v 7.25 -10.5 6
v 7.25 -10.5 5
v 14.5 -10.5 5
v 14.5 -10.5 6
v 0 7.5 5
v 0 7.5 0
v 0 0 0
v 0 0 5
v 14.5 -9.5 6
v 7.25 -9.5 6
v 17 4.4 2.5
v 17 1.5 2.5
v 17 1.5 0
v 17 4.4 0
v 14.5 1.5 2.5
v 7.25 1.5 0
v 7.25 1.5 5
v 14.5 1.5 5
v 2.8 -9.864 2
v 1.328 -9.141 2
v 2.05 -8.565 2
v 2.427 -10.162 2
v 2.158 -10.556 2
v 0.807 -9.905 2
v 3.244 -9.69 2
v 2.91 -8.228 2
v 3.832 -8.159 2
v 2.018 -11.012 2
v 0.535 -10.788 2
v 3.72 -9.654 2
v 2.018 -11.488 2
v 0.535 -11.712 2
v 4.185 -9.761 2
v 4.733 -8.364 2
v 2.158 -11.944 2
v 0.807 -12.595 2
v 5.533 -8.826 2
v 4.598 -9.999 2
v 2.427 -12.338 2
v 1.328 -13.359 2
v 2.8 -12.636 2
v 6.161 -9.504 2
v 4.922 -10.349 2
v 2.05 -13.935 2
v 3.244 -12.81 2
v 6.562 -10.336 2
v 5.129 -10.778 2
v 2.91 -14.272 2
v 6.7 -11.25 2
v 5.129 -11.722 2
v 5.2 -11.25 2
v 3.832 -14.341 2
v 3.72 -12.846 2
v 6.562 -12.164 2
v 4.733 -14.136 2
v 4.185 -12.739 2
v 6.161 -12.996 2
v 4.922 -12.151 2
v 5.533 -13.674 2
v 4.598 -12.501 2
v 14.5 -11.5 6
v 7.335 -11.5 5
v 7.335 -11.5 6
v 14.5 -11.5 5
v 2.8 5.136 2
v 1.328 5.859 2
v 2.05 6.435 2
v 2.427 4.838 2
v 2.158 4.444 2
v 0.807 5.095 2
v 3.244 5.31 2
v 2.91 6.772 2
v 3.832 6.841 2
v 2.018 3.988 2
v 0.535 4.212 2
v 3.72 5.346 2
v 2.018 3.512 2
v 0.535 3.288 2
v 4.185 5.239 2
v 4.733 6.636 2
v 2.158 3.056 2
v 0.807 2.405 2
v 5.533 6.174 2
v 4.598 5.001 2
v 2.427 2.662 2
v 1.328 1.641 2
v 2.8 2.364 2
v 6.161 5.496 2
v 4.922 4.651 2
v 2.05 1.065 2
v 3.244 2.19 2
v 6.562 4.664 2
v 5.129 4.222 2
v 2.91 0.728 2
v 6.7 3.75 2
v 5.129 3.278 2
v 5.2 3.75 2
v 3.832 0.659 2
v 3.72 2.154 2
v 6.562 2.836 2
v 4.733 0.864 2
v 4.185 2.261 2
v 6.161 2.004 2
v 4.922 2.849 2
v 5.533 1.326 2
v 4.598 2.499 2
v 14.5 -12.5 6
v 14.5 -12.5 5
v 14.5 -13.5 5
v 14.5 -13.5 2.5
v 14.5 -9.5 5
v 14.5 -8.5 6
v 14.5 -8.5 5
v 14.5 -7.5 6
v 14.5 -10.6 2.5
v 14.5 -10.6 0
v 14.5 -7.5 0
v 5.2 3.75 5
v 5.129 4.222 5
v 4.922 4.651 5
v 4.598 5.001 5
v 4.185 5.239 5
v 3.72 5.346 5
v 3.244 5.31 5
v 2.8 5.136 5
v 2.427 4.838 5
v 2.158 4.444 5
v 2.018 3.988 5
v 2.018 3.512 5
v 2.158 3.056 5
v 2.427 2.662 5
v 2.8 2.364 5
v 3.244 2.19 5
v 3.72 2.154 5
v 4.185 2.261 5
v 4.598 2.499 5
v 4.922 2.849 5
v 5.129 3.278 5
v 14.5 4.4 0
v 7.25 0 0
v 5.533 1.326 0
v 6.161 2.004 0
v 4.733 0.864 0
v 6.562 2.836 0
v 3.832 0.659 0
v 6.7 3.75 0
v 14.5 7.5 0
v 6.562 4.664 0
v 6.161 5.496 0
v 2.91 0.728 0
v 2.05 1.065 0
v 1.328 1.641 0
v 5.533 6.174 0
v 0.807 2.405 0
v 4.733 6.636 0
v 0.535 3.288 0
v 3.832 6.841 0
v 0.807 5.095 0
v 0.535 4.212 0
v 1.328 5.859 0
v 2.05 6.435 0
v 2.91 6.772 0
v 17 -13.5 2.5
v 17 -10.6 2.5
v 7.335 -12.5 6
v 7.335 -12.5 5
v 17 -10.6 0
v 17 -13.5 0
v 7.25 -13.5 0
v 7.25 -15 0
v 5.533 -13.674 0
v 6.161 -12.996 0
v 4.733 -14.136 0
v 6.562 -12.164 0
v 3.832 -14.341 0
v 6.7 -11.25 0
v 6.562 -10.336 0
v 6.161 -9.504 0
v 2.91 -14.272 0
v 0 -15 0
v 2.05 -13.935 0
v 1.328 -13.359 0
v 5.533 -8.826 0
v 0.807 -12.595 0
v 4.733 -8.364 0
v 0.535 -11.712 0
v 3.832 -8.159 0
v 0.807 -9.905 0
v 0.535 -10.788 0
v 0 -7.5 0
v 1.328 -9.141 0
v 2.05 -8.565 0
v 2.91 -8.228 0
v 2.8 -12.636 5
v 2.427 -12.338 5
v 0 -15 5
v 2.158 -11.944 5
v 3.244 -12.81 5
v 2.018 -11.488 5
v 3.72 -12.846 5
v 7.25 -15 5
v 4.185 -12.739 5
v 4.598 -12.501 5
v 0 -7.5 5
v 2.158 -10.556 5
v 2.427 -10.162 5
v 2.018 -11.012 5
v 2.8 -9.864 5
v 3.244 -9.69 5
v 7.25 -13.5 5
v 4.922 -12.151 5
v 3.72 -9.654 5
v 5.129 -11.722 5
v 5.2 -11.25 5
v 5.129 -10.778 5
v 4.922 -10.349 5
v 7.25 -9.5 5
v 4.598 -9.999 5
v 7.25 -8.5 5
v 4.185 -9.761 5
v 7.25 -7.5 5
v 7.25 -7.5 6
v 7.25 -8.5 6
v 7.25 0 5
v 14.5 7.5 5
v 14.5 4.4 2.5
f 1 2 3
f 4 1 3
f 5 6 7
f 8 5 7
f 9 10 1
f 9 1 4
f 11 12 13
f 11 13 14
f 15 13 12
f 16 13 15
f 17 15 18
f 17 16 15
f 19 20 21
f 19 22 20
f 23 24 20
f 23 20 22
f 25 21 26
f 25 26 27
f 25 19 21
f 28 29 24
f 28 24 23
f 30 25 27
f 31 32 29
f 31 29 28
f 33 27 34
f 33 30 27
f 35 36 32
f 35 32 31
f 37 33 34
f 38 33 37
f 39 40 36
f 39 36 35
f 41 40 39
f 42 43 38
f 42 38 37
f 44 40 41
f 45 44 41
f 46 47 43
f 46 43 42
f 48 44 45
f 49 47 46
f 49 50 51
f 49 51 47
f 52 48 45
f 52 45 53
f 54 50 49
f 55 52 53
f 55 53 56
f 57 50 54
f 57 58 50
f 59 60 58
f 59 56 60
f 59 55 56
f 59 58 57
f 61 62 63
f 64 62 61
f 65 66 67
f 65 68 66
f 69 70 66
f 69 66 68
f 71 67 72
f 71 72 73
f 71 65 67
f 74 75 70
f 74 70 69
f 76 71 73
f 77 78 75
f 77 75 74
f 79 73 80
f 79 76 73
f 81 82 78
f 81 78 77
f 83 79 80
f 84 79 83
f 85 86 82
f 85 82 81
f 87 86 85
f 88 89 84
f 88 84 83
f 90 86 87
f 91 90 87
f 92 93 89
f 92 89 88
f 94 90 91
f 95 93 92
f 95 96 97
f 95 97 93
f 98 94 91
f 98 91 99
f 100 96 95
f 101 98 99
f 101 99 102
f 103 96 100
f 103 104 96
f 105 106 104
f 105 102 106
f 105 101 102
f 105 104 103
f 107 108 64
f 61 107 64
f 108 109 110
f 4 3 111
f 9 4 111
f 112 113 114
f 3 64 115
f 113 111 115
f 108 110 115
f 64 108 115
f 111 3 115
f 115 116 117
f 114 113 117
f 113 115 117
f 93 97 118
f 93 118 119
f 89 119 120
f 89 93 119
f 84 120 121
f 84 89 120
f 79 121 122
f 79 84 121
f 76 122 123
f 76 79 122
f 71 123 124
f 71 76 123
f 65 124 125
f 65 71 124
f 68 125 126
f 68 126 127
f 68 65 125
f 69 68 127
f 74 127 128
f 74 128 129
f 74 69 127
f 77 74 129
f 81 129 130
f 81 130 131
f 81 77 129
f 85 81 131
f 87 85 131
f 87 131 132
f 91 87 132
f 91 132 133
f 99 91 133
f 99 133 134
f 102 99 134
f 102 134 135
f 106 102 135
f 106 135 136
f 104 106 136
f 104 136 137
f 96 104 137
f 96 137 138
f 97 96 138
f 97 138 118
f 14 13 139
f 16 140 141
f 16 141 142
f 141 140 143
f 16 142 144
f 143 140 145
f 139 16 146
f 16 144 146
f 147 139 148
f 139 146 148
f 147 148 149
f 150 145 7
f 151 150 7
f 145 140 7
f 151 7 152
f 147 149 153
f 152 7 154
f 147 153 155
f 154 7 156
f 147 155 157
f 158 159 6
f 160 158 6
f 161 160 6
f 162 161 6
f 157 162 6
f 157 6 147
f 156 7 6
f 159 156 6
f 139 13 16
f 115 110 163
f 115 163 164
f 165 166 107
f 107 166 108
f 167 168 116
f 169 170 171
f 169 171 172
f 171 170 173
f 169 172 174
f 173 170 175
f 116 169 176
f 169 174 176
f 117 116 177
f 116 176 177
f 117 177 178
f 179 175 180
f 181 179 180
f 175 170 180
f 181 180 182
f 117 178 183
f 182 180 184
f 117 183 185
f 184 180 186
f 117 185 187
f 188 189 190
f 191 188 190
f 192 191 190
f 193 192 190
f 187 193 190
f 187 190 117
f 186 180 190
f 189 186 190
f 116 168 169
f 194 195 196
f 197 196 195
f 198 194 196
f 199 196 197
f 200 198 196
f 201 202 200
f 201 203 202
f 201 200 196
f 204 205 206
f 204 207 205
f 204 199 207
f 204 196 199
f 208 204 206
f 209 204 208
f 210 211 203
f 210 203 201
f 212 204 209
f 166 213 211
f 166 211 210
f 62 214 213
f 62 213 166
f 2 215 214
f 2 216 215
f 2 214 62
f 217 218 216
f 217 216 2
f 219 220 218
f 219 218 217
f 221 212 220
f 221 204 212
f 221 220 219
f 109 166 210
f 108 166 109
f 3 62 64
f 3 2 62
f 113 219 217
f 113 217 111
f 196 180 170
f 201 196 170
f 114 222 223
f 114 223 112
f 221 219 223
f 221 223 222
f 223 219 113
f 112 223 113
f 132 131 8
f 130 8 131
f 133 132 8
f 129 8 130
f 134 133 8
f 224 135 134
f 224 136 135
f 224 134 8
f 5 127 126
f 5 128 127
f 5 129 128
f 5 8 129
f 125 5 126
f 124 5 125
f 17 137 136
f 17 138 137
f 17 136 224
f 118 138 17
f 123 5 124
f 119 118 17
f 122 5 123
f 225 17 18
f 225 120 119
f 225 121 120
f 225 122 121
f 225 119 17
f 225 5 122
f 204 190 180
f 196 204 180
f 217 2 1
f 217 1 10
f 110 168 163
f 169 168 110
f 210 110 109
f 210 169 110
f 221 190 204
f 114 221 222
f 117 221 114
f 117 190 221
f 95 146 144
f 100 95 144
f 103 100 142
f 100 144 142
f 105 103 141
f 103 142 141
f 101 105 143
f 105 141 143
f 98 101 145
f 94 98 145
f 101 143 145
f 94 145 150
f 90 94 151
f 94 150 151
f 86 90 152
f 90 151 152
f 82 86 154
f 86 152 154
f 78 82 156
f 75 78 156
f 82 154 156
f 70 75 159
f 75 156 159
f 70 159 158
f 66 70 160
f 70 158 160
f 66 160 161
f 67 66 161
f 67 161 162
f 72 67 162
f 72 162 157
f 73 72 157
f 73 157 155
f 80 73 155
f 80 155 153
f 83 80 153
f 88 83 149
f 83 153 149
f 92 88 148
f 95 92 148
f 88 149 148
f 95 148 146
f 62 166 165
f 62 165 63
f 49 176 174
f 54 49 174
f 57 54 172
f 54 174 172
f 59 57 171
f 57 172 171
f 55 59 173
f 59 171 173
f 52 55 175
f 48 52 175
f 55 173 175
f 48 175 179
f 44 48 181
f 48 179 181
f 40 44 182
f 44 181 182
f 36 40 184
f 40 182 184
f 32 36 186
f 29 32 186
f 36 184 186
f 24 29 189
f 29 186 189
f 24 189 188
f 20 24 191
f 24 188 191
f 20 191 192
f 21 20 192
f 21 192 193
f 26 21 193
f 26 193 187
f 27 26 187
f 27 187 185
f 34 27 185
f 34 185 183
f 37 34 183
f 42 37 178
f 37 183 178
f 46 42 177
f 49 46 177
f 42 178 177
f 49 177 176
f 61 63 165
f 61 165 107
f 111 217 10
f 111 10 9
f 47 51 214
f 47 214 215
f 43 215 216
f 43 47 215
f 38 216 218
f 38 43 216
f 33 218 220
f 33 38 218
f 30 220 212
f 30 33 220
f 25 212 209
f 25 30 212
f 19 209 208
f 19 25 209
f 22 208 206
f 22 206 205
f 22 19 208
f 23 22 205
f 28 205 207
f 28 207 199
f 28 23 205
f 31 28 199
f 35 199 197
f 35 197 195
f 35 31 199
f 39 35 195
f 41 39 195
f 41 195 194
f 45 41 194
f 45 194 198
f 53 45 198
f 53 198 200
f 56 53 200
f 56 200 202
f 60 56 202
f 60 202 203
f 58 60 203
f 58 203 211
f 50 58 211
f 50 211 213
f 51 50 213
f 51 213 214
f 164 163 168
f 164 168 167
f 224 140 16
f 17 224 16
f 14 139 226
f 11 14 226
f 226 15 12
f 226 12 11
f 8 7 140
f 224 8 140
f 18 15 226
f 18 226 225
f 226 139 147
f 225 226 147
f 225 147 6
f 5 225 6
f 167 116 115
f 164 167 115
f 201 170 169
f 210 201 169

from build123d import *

# Parameters (mm, degrees)
F0_R     = 1.6
F1_DEPTH = 5
F2_W     = 2.9
F2_H     = 2.5
F3_DEPTH = 2.5
F4_R     = 3.1
F4_R_2   = 1.6
F5_DEPTH = 2
F7_W     = 7.25
F7_H     = 1
F7_W_2   = 7.1653089933
F8_DEPTH = 1


with BuildPart() as f1:
    # F0 (on Top) → F1 (new body)
    with BuildSketch(Plane.XY):
        Polygon((0, 7.5), (0, 0), (7.25, 0), (7.25, 1.5), (14.5, 1.5), (14.5, 7.5), align=None)
        with Locations((3.6, 3.75)):
            Circle(F0_R, mode=Mode.SUBTRACT)
    extrude(amount=F1_DEPTH)

    # F2 (on face) → F3 (join)
    with BuildSketch(Plane.YZ.offset(14.5)):
        with Locations((2.95, 1.25)):
            Rectangle(F2_W, F2_H)
    extrude(amount=F3_DEPTH)

    # F4 (on face) → F5 (cut)
    with BuildSketch(Plane(origin=(0, 0, 0), x_dir=(1, 0, 0), z_dir=(0, 0, -1))):
        with Locations((3.6, -3.75)):
            Circle(F4_R)
        with Locations((3.6, -3.75)):
            Circle(F4_R_2, mode=Mode.SUBTRACT)
    extrude(amount=-F5_DEPTH, mode=Mode.SUBTRACT)


with BuildPart() as f6_1:
    # F6: copy of F1
    add(f1.part.moved(Location((0, -15, 0))))

    # F7 (on face) → F8 (join)
    with BuildSketch(Plane.XY.offset(5)):
        with Locations((10.875, -8)):
            Rectangle(F7_W, F7_H)
        with Locations((10.875, -10)):
            Rectangle(F7_W, F7_H)
        with Locations((10.9173455033, -12)):
            Rectangle(F7_W_2, F7_H)
    extrude(amount=F8_DEPTH)


solid = Compound([f1.part, f6_1.part])
